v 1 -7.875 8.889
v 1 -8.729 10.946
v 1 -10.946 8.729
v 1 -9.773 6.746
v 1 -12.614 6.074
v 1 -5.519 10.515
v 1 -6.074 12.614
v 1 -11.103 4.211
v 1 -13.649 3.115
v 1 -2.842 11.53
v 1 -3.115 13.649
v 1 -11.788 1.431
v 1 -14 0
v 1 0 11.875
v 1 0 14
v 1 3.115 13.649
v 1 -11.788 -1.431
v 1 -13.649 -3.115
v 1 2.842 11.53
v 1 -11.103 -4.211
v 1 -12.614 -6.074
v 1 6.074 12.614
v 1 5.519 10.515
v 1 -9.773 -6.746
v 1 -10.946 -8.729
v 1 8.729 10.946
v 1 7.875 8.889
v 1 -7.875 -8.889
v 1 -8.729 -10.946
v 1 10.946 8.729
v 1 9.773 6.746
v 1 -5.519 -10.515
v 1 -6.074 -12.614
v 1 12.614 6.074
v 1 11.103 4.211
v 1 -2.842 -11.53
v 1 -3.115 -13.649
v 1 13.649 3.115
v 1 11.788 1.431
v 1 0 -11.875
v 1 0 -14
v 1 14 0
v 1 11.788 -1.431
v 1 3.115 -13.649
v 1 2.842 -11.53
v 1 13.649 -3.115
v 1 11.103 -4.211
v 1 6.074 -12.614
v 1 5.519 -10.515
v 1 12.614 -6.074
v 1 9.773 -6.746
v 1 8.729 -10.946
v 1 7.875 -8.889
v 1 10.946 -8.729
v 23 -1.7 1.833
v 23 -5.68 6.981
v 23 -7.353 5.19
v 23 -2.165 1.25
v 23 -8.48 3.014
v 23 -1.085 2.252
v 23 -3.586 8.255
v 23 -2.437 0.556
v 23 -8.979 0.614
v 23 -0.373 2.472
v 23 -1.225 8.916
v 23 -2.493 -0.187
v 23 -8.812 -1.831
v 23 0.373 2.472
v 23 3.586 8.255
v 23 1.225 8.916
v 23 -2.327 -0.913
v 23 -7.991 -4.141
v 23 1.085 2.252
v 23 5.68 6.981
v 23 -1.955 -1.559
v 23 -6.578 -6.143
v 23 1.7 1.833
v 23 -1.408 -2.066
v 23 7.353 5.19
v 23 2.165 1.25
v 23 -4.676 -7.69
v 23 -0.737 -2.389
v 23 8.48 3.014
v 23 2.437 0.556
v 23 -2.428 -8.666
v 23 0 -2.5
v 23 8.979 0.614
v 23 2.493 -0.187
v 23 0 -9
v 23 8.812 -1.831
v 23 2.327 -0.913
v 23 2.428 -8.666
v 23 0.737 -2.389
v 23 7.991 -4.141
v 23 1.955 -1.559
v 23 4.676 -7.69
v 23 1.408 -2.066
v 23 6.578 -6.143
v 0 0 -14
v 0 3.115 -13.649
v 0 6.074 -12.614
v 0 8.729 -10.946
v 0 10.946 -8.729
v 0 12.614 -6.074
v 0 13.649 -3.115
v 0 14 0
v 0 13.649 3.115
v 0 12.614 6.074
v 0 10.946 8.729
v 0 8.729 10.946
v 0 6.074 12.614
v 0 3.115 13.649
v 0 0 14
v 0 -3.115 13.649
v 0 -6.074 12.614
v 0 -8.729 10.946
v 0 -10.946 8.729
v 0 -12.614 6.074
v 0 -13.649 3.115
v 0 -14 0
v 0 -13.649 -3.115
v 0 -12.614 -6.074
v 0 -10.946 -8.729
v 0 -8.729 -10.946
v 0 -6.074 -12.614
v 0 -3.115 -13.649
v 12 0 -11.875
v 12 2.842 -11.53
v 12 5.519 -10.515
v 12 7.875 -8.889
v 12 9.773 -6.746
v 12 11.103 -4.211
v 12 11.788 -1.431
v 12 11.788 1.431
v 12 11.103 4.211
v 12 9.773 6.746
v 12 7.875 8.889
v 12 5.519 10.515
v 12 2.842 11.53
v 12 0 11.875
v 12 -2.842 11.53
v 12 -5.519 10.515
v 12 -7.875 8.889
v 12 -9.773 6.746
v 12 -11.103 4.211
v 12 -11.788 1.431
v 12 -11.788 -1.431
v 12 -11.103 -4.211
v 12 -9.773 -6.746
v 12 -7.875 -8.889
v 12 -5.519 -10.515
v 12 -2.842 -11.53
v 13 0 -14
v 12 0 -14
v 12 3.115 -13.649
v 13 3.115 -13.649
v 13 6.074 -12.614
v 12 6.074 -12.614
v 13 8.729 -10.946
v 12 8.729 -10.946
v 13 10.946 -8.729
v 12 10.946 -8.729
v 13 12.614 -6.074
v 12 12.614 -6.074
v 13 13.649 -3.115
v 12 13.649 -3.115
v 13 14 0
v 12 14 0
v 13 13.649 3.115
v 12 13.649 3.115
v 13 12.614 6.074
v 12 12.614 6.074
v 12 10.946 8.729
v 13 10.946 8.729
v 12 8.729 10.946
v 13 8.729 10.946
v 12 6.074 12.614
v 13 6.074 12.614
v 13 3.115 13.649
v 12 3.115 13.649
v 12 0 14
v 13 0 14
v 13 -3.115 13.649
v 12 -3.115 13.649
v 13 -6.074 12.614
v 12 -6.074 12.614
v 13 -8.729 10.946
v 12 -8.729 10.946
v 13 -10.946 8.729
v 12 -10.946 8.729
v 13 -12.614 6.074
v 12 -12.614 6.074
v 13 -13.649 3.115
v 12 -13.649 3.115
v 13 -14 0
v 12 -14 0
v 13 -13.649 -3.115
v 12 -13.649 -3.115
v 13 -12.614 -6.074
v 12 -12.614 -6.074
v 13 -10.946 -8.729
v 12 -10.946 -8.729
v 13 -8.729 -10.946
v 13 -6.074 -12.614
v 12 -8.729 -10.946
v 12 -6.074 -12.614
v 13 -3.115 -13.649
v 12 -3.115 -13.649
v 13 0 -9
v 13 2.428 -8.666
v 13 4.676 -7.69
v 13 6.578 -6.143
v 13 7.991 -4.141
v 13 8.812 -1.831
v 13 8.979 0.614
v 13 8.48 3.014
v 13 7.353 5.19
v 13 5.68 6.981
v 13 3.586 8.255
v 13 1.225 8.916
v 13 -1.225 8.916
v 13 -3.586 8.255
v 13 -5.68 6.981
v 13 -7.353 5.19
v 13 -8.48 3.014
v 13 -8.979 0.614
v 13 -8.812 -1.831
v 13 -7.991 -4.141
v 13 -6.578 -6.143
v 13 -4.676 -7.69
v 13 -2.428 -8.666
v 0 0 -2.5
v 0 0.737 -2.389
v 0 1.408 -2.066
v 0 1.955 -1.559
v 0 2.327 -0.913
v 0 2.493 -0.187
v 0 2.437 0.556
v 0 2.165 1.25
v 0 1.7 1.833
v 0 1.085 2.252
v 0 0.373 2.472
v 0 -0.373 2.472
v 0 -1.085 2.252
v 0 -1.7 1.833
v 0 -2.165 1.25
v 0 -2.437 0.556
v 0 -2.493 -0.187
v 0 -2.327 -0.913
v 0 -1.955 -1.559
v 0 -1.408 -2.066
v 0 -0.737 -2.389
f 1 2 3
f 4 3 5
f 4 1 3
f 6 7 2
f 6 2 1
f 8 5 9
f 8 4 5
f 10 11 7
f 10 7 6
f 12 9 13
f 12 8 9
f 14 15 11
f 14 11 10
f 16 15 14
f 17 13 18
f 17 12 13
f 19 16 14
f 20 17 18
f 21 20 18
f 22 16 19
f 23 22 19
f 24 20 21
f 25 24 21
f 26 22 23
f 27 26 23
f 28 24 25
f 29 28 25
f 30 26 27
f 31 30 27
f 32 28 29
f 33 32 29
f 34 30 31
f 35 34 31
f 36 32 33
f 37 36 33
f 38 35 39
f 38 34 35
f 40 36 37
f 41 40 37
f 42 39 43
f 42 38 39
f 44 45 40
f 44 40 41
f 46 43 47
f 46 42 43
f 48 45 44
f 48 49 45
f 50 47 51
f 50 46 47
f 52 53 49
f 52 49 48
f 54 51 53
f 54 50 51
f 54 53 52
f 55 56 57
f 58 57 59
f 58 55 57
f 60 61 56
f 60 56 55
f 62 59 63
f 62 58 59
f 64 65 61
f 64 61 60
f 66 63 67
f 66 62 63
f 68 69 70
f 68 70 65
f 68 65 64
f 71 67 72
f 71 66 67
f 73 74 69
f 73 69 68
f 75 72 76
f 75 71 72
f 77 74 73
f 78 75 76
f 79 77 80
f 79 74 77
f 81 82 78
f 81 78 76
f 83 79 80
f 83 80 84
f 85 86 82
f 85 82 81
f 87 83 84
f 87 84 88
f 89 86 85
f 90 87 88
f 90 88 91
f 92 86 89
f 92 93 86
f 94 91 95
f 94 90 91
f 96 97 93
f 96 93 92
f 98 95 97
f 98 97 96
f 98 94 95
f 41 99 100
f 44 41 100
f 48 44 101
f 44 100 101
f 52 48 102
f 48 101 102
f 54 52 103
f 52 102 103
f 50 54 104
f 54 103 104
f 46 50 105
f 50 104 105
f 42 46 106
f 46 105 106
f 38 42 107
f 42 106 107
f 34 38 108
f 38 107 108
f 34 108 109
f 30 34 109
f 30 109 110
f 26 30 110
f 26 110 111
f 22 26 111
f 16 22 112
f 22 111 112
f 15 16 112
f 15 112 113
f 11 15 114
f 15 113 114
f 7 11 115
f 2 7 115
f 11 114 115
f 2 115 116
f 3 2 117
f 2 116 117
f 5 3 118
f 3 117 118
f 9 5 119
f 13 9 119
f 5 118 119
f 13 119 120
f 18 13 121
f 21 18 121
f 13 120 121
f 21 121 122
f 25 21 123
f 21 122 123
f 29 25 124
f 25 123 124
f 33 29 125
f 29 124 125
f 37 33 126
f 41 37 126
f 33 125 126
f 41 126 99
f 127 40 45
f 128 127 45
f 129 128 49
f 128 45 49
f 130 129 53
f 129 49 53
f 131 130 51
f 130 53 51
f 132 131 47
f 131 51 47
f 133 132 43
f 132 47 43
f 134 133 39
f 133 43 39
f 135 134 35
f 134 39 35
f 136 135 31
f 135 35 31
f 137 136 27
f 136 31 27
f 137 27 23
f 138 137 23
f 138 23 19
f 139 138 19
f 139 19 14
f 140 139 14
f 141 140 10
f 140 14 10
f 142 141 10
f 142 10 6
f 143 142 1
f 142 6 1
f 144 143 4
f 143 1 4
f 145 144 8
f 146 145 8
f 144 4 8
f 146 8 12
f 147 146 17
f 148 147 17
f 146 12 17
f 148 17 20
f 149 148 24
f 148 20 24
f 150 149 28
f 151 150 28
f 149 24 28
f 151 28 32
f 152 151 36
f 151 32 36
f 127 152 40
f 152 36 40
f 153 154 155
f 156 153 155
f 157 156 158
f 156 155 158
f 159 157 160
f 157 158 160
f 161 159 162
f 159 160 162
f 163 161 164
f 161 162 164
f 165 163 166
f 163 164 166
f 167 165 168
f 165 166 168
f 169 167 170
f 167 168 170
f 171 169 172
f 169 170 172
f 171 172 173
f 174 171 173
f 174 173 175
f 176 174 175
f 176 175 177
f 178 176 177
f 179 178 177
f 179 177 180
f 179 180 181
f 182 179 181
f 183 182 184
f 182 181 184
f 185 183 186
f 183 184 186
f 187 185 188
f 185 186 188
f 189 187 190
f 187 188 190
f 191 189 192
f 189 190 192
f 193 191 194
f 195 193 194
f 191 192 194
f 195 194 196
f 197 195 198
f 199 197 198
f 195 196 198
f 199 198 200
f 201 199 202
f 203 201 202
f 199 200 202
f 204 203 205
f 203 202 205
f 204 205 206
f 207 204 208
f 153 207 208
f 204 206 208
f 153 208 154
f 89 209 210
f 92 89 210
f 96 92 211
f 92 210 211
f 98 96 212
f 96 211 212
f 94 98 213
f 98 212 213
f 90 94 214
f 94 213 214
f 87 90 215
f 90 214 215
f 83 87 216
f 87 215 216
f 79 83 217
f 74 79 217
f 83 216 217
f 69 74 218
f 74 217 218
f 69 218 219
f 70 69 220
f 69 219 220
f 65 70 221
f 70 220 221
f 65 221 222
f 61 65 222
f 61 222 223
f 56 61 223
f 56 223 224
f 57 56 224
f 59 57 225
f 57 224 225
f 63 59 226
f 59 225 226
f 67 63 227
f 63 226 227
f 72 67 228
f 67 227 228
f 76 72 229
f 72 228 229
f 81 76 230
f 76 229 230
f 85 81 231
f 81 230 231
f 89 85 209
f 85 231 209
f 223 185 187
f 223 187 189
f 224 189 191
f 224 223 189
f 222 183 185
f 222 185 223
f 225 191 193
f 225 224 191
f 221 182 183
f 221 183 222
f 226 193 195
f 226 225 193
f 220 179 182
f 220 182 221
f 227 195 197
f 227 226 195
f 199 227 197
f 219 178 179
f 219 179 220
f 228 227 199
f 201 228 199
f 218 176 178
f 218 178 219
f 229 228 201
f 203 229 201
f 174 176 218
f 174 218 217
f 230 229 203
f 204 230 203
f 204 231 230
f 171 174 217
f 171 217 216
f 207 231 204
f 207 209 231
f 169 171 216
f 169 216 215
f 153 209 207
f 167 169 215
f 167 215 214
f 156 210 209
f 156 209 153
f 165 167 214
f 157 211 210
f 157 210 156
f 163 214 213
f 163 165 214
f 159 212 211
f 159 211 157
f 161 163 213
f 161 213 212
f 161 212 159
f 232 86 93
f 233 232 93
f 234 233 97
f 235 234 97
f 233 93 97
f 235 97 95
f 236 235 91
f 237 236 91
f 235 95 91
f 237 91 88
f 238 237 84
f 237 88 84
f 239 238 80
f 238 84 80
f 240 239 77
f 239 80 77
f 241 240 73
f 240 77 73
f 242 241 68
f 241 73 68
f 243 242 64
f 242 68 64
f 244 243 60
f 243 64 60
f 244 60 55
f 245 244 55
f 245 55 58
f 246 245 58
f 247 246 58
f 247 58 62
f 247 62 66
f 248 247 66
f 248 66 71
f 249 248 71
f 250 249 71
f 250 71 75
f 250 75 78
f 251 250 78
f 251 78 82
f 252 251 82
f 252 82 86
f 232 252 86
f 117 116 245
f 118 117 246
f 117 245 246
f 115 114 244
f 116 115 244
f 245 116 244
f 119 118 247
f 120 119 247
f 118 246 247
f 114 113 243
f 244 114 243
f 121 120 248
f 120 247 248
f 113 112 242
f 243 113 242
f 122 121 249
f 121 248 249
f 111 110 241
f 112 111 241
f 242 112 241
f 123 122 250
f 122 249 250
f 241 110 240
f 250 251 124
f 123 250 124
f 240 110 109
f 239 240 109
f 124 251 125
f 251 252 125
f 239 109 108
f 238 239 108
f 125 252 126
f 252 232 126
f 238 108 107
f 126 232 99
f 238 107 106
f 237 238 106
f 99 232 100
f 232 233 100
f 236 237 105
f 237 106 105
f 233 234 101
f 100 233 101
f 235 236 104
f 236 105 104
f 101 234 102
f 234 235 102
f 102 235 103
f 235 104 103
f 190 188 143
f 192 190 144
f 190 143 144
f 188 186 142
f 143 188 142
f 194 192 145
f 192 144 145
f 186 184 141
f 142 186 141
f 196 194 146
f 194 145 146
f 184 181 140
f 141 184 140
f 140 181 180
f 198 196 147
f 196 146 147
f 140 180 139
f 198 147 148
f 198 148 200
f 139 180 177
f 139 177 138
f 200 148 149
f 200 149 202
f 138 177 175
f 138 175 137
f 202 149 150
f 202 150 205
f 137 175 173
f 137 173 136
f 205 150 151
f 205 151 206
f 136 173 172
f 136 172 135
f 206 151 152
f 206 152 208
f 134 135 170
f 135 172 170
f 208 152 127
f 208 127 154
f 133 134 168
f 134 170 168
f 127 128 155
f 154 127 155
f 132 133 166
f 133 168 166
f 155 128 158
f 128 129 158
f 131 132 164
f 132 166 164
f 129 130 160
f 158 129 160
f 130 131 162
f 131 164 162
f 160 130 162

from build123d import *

# Parameters (mm, degrees)
SKETCH1_R           = 14
BOSS_EXTRUDE1_DEPTH = 1
SKETCH2_R           = 11.875
BOSS_EXTRUDE2_DEPTH = 11
SKETCH3_R           = 14
BOSS_EXTRUDE3_DEPTH = 1
SKETCH4_R           = 9
BOSS_EXTRUDE4_DEPTH = 10
SKETCH5_R           = 2.5
CUT_EXTRUDE1_DEPTH  = 31.347981811


with BuildPart() as part:
    # Sketch1 → Boss-Extrude1 (new body)
    with BuildSketch(Plane(origin=(0, 0, 0), x_dir=(0, 0, -1), z_dir=(1, 0, 0))):
        Circle(SKETCH1_R)
    extrude(amount=BOSS_EXTRUDE1_DEPTH)

    # Sketch2 → Boss-Extrude2 (add)
    with BuildSketch(Plane(origin=(1, 0, 0), x_dir=(0, 0, -1), z_dir=(1, 0, 0))):
        Circle(SKETCH2_R)
    extrude(amount=BOSS_EXTRUDE2_DEPTH)

    # Sketch3 → Boss-Extrude3 (add)
    with BuildSketch(Plane(origin=(12, 0, 0), x_dir=(0, 0, -1), z_dir=(1, 0, 0))):
        Circle(SKETCH3_R)
    extrude(amount=BOSS_EXTRUDE3_DEPTH)

    # Sketch4 → Boss-Extrude4 (add)
    with BuildSketch(Plane(origin=(13, 0, 0), x_dir=(0, 0, -1), z_dir=(1, 0, 0))):
        Circle(SKETCH4_R)
    extrude(amount=BOSS_EXTRUDE4_DEPTH)

    # Sketch5 → Cut-Extrude1 (cut, through all)
    with BuildSketch(Plane(origin=(23, 0, 0), x_dir=(0, 0, -1), z_dir=(1, 0, 0))):
        Circle(SKETCH5_R)
    extrude(amount=-CUT_EXTRUDE1_DEPTH, mode=Mode.SUBTRACT)


solid = part.part
